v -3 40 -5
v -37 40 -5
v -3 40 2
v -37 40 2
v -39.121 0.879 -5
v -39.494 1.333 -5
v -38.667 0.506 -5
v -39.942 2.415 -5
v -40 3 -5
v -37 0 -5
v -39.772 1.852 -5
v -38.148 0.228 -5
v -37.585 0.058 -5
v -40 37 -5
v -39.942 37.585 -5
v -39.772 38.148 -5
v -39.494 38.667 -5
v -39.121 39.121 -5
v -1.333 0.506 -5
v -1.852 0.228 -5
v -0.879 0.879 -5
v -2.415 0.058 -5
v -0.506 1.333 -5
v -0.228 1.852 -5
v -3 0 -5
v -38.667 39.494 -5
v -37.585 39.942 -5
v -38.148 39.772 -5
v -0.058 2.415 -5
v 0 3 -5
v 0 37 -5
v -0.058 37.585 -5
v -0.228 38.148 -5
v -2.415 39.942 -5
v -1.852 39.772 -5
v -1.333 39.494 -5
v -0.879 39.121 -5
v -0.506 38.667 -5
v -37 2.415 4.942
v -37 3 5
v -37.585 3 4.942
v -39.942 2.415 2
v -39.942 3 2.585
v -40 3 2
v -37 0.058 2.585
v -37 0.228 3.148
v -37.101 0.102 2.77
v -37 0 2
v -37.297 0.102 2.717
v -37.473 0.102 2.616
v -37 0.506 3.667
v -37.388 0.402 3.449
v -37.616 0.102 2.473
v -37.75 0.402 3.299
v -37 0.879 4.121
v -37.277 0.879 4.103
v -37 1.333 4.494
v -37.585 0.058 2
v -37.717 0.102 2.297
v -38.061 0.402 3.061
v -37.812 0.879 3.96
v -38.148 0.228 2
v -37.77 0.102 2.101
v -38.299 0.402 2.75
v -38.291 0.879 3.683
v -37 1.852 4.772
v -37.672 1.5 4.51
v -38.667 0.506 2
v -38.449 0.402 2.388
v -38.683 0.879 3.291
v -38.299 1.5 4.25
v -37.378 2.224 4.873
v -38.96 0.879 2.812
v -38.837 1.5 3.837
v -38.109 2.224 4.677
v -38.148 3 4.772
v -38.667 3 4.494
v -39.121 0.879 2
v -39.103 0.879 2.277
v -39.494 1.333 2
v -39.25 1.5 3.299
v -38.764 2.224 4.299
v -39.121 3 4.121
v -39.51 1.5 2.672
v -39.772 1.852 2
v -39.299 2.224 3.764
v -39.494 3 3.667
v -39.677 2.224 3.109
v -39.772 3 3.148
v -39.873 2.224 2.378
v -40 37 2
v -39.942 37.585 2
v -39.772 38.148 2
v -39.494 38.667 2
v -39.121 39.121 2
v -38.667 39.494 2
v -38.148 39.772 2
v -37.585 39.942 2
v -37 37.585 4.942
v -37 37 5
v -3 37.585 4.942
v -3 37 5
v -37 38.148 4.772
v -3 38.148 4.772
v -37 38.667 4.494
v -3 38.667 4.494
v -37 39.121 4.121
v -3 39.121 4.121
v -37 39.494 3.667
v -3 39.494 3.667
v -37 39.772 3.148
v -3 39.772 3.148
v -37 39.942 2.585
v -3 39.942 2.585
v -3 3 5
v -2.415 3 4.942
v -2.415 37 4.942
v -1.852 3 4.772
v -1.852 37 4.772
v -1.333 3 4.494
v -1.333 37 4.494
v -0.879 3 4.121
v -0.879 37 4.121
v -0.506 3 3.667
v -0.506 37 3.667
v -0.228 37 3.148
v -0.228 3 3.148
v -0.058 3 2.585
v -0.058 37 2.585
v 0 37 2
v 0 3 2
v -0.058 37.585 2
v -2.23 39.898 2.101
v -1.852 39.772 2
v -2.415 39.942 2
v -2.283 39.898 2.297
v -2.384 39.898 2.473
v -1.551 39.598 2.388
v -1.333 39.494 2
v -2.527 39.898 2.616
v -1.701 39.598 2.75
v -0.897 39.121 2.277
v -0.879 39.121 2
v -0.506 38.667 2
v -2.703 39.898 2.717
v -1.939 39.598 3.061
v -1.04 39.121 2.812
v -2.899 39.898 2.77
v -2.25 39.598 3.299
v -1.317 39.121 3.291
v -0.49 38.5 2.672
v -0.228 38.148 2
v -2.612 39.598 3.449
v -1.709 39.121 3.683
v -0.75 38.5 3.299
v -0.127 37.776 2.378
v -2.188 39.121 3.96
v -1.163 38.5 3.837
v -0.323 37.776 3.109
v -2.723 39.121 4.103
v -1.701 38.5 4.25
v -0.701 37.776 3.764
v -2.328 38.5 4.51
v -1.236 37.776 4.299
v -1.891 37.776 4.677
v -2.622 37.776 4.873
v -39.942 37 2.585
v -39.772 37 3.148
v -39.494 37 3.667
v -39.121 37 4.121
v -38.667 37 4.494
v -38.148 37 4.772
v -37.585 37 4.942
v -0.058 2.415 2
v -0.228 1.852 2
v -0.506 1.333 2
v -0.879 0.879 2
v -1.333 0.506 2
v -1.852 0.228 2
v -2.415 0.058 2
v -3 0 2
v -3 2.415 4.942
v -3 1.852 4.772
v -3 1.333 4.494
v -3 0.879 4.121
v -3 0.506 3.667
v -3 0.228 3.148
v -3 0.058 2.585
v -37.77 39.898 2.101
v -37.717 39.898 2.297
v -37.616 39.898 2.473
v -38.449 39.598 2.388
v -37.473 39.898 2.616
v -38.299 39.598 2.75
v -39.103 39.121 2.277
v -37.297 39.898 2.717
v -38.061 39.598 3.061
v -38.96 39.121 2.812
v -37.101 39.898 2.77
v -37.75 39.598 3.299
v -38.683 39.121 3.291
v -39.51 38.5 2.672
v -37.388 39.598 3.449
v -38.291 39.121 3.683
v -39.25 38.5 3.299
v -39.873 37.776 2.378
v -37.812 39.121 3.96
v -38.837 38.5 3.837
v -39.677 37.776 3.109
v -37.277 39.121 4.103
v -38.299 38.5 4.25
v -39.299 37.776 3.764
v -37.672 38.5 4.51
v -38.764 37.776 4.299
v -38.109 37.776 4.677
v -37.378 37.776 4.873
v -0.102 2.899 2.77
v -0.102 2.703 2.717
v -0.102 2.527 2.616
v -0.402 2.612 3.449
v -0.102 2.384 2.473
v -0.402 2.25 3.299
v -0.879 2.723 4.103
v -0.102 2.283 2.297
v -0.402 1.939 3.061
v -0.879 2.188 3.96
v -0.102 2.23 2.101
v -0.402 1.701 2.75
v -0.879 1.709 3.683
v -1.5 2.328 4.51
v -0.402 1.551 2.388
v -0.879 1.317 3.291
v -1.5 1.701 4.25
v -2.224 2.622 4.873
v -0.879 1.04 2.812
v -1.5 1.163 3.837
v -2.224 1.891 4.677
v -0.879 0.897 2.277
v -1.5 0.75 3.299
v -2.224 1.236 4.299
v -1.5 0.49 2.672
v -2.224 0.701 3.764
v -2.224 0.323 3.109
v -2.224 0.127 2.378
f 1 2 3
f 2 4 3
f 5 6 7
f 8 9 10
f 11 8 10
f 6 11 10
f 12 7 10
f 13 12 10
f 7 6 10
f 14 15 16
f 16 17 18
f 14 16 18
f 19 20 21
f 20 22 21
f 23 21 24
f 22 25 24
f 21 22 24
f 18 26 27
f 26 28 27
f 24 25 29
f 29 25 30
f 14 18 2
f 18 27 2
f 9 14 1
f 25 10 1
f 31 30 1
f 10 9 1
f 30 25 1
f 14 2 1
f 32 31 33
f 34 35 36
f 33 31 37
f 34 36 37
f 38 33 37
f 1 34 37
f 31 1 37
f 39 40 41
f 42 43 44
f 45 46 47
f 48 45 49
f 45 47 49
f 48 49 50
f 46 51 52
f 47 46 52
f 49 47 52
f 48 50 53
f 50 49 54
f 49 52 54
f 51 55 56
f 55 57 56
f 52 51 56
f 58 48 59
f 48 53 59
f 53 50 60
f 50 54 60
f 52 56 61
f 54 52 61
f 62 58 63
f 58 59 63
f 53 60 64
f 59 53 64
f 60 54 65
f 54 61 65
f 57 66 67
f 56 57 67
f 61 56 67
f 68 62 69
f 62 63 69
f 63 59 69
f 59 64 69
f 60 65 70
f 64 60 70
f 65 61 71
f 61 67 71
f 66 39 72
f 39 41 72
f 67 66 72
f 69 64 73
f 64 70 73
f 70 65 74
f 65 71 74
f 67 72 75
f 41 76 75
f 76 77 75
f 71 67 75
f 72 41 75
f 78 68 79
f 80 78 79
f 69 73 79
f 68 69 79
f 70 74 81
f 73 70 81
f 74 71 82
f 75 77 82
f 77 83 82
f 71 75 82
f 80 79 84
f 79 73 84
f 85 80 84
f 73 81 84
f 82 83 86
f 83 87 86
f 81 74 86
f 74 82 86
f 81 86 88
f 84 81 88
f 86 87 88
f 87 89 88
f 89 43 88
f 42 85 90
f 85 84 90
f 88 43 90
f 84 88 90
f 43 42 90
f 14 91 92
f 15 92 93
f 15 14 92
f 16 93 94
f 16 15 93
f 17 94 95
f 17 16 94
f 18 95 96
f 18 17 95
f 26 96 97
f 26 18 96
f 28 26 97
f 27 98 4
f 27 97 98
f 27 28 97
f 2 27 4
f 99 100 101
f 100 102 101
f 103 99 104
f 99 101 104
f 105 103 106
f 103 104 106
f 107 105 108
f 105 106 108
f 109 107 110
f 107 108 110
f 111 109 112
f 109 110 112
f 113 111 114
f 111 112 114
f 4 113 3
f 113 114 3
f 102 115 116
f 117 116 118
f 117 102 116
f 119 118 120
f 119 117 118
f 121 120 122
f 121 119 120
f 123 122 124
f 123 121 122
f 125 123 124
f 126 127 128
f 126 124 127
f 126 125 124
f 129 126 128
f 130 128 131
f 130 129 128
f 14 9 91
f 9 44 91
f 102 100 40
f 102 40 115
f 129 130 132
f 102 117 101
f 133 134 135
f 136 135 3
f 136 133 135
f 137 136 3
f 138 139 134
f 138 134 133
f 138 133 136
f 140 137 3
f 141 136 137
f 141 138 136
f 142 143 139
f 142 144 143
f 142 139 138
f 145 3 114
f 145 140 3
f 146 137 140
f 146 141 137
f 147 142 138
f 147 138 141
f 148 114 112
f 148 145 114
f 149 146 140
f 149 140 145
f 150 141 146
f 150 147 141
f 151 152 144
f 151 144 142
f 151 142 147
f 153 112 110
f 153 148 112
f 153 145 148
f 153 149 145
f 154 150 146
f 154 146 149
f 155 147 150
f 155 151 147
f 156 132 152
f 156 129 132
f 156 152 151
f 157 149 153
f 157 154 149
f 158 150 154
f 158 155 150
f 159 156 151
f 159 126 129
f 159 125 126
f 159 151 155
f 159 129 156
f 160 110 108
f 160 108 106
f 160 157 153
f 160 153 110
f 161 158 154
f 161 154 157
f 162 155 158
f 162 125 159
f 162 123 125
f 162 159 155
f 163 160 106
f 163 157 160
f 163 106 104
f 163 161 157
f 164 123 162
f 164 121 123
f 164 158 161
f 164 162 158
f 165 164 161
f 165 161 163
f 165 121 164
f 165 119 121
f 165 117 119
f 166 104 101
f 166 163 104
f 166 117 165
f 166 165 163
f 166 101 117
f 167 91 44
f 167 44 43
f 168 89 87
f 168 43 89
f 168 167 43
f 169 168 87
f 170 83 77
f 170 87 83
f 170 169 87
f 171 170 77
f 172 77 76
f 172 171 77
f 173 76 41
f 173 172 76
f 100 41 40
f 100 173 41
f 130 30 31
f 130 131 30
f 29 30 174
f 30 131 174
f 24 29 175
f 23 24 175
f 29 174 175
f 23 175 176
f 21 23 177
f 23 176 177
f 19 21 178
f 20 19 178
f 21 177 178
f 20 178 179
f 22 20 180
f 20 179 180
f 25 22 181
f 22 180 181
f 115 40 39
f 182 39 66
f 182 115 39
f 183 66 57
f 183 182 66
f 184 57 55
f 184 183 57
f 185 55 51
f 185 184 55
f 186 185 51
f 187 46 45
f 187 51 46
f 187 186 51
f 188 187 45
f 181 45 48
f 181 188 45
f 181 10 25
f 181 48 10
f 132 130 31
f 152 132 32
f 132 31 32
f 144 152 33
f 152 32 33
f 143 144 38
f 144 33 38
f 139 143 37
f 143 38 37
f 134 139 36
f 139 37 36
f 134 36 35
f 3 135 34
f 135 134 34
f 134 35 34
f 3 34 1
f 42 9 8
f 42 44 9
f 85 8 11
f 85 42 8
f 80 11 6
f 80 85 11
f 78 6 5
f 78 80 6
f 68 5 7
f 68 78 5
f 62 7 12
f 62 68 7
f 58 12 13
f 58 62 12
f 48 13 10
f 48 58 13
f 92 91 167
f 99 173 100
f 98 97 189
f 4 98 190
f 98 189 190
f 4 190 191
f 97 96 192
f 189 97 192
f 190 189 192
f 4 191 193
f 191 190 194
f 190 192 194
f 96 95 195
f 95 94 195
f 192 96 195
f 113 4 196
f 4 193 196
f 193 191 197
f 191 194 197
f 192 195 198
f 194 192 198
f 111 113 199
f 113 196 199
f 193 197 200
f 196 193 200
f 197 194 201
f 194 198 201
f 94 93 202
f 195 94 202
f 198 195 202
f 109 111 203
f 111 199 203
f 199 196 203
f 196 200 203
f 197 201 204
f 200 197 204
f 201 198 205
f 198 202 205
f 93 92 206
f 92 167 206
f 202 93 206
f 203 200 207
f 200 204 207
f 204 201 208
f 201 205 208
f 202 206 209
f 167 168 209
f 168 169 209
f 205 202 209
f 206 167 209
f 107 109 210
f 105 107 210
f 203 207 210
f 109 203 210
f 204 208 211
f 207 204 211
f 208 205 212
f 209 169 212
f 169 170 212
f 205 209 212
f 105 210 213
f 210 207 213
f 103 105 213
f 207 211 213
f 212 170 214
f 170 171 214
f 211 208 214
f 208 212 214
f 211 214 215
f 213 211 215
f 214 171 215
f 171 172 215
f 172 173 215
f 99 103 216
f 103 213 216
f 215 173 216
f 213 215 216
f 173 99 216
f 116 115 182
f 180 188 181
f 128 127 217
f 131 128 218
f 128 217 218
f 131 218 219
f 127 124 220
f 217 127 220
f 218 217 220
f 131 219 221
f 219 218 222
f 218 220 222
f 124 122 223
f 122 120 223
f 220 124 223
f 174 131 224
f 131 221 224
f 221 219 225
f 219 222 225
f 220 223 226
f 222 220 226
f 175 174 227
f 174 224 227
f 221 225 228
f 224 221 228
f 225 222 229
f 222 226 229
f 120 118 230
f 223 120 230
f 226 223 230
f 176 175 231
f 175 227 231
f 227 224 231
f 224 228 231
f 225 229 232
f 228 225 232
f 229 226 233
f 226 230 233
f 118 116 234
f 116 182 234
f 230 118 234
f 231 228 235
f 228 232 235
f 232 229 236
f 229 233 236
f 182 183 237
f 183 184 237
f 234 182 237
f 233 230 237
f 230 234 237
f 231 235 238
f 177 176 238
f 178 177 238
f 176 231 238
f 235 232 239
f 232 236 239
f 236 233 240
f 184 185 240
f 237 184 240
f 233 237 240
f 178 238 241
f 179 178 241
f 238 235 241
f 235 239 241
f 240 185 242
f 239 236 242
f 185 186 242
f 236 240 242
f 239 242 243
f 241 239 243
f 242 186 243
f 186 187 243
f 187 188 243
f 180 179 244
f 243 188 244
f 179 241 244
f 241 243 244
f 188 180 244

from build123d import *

# Parameters (mm, degrees)
SKETCH1_W           = 40
SKETCH1_H           = 40
BOSS_EXTRUDE1_DEPTH = 5
FILLET1_R           = 3


with BuildPart() as part:
    # Sketch1 → Boss-Extrude1 (new body, symmetric)
    with BuildSketch(Plane.XY):
        with Locations((-20, 20)):
            Rectangle(SKETCH1_W, SKETCH1_H)
    extrude(amount=BOSS_EXTRUDE1_DEPTH, both=True)

    # Fillet1
    fillet1_edges = [part.edges().sort_by_distance(p)[0] for p in [
        (-40, 20, 5),
        (-20, 0, 5),
        (0, 20, 5),
        (0, 0, 0),
        (-40, 0, 0),
        (-40, 40, 0),
        (0, 40, 0),
        (-20, 40, 5),
    ]]
    fillet(fillet1_edges, radius=FILLET1_R)


solid = part.part
